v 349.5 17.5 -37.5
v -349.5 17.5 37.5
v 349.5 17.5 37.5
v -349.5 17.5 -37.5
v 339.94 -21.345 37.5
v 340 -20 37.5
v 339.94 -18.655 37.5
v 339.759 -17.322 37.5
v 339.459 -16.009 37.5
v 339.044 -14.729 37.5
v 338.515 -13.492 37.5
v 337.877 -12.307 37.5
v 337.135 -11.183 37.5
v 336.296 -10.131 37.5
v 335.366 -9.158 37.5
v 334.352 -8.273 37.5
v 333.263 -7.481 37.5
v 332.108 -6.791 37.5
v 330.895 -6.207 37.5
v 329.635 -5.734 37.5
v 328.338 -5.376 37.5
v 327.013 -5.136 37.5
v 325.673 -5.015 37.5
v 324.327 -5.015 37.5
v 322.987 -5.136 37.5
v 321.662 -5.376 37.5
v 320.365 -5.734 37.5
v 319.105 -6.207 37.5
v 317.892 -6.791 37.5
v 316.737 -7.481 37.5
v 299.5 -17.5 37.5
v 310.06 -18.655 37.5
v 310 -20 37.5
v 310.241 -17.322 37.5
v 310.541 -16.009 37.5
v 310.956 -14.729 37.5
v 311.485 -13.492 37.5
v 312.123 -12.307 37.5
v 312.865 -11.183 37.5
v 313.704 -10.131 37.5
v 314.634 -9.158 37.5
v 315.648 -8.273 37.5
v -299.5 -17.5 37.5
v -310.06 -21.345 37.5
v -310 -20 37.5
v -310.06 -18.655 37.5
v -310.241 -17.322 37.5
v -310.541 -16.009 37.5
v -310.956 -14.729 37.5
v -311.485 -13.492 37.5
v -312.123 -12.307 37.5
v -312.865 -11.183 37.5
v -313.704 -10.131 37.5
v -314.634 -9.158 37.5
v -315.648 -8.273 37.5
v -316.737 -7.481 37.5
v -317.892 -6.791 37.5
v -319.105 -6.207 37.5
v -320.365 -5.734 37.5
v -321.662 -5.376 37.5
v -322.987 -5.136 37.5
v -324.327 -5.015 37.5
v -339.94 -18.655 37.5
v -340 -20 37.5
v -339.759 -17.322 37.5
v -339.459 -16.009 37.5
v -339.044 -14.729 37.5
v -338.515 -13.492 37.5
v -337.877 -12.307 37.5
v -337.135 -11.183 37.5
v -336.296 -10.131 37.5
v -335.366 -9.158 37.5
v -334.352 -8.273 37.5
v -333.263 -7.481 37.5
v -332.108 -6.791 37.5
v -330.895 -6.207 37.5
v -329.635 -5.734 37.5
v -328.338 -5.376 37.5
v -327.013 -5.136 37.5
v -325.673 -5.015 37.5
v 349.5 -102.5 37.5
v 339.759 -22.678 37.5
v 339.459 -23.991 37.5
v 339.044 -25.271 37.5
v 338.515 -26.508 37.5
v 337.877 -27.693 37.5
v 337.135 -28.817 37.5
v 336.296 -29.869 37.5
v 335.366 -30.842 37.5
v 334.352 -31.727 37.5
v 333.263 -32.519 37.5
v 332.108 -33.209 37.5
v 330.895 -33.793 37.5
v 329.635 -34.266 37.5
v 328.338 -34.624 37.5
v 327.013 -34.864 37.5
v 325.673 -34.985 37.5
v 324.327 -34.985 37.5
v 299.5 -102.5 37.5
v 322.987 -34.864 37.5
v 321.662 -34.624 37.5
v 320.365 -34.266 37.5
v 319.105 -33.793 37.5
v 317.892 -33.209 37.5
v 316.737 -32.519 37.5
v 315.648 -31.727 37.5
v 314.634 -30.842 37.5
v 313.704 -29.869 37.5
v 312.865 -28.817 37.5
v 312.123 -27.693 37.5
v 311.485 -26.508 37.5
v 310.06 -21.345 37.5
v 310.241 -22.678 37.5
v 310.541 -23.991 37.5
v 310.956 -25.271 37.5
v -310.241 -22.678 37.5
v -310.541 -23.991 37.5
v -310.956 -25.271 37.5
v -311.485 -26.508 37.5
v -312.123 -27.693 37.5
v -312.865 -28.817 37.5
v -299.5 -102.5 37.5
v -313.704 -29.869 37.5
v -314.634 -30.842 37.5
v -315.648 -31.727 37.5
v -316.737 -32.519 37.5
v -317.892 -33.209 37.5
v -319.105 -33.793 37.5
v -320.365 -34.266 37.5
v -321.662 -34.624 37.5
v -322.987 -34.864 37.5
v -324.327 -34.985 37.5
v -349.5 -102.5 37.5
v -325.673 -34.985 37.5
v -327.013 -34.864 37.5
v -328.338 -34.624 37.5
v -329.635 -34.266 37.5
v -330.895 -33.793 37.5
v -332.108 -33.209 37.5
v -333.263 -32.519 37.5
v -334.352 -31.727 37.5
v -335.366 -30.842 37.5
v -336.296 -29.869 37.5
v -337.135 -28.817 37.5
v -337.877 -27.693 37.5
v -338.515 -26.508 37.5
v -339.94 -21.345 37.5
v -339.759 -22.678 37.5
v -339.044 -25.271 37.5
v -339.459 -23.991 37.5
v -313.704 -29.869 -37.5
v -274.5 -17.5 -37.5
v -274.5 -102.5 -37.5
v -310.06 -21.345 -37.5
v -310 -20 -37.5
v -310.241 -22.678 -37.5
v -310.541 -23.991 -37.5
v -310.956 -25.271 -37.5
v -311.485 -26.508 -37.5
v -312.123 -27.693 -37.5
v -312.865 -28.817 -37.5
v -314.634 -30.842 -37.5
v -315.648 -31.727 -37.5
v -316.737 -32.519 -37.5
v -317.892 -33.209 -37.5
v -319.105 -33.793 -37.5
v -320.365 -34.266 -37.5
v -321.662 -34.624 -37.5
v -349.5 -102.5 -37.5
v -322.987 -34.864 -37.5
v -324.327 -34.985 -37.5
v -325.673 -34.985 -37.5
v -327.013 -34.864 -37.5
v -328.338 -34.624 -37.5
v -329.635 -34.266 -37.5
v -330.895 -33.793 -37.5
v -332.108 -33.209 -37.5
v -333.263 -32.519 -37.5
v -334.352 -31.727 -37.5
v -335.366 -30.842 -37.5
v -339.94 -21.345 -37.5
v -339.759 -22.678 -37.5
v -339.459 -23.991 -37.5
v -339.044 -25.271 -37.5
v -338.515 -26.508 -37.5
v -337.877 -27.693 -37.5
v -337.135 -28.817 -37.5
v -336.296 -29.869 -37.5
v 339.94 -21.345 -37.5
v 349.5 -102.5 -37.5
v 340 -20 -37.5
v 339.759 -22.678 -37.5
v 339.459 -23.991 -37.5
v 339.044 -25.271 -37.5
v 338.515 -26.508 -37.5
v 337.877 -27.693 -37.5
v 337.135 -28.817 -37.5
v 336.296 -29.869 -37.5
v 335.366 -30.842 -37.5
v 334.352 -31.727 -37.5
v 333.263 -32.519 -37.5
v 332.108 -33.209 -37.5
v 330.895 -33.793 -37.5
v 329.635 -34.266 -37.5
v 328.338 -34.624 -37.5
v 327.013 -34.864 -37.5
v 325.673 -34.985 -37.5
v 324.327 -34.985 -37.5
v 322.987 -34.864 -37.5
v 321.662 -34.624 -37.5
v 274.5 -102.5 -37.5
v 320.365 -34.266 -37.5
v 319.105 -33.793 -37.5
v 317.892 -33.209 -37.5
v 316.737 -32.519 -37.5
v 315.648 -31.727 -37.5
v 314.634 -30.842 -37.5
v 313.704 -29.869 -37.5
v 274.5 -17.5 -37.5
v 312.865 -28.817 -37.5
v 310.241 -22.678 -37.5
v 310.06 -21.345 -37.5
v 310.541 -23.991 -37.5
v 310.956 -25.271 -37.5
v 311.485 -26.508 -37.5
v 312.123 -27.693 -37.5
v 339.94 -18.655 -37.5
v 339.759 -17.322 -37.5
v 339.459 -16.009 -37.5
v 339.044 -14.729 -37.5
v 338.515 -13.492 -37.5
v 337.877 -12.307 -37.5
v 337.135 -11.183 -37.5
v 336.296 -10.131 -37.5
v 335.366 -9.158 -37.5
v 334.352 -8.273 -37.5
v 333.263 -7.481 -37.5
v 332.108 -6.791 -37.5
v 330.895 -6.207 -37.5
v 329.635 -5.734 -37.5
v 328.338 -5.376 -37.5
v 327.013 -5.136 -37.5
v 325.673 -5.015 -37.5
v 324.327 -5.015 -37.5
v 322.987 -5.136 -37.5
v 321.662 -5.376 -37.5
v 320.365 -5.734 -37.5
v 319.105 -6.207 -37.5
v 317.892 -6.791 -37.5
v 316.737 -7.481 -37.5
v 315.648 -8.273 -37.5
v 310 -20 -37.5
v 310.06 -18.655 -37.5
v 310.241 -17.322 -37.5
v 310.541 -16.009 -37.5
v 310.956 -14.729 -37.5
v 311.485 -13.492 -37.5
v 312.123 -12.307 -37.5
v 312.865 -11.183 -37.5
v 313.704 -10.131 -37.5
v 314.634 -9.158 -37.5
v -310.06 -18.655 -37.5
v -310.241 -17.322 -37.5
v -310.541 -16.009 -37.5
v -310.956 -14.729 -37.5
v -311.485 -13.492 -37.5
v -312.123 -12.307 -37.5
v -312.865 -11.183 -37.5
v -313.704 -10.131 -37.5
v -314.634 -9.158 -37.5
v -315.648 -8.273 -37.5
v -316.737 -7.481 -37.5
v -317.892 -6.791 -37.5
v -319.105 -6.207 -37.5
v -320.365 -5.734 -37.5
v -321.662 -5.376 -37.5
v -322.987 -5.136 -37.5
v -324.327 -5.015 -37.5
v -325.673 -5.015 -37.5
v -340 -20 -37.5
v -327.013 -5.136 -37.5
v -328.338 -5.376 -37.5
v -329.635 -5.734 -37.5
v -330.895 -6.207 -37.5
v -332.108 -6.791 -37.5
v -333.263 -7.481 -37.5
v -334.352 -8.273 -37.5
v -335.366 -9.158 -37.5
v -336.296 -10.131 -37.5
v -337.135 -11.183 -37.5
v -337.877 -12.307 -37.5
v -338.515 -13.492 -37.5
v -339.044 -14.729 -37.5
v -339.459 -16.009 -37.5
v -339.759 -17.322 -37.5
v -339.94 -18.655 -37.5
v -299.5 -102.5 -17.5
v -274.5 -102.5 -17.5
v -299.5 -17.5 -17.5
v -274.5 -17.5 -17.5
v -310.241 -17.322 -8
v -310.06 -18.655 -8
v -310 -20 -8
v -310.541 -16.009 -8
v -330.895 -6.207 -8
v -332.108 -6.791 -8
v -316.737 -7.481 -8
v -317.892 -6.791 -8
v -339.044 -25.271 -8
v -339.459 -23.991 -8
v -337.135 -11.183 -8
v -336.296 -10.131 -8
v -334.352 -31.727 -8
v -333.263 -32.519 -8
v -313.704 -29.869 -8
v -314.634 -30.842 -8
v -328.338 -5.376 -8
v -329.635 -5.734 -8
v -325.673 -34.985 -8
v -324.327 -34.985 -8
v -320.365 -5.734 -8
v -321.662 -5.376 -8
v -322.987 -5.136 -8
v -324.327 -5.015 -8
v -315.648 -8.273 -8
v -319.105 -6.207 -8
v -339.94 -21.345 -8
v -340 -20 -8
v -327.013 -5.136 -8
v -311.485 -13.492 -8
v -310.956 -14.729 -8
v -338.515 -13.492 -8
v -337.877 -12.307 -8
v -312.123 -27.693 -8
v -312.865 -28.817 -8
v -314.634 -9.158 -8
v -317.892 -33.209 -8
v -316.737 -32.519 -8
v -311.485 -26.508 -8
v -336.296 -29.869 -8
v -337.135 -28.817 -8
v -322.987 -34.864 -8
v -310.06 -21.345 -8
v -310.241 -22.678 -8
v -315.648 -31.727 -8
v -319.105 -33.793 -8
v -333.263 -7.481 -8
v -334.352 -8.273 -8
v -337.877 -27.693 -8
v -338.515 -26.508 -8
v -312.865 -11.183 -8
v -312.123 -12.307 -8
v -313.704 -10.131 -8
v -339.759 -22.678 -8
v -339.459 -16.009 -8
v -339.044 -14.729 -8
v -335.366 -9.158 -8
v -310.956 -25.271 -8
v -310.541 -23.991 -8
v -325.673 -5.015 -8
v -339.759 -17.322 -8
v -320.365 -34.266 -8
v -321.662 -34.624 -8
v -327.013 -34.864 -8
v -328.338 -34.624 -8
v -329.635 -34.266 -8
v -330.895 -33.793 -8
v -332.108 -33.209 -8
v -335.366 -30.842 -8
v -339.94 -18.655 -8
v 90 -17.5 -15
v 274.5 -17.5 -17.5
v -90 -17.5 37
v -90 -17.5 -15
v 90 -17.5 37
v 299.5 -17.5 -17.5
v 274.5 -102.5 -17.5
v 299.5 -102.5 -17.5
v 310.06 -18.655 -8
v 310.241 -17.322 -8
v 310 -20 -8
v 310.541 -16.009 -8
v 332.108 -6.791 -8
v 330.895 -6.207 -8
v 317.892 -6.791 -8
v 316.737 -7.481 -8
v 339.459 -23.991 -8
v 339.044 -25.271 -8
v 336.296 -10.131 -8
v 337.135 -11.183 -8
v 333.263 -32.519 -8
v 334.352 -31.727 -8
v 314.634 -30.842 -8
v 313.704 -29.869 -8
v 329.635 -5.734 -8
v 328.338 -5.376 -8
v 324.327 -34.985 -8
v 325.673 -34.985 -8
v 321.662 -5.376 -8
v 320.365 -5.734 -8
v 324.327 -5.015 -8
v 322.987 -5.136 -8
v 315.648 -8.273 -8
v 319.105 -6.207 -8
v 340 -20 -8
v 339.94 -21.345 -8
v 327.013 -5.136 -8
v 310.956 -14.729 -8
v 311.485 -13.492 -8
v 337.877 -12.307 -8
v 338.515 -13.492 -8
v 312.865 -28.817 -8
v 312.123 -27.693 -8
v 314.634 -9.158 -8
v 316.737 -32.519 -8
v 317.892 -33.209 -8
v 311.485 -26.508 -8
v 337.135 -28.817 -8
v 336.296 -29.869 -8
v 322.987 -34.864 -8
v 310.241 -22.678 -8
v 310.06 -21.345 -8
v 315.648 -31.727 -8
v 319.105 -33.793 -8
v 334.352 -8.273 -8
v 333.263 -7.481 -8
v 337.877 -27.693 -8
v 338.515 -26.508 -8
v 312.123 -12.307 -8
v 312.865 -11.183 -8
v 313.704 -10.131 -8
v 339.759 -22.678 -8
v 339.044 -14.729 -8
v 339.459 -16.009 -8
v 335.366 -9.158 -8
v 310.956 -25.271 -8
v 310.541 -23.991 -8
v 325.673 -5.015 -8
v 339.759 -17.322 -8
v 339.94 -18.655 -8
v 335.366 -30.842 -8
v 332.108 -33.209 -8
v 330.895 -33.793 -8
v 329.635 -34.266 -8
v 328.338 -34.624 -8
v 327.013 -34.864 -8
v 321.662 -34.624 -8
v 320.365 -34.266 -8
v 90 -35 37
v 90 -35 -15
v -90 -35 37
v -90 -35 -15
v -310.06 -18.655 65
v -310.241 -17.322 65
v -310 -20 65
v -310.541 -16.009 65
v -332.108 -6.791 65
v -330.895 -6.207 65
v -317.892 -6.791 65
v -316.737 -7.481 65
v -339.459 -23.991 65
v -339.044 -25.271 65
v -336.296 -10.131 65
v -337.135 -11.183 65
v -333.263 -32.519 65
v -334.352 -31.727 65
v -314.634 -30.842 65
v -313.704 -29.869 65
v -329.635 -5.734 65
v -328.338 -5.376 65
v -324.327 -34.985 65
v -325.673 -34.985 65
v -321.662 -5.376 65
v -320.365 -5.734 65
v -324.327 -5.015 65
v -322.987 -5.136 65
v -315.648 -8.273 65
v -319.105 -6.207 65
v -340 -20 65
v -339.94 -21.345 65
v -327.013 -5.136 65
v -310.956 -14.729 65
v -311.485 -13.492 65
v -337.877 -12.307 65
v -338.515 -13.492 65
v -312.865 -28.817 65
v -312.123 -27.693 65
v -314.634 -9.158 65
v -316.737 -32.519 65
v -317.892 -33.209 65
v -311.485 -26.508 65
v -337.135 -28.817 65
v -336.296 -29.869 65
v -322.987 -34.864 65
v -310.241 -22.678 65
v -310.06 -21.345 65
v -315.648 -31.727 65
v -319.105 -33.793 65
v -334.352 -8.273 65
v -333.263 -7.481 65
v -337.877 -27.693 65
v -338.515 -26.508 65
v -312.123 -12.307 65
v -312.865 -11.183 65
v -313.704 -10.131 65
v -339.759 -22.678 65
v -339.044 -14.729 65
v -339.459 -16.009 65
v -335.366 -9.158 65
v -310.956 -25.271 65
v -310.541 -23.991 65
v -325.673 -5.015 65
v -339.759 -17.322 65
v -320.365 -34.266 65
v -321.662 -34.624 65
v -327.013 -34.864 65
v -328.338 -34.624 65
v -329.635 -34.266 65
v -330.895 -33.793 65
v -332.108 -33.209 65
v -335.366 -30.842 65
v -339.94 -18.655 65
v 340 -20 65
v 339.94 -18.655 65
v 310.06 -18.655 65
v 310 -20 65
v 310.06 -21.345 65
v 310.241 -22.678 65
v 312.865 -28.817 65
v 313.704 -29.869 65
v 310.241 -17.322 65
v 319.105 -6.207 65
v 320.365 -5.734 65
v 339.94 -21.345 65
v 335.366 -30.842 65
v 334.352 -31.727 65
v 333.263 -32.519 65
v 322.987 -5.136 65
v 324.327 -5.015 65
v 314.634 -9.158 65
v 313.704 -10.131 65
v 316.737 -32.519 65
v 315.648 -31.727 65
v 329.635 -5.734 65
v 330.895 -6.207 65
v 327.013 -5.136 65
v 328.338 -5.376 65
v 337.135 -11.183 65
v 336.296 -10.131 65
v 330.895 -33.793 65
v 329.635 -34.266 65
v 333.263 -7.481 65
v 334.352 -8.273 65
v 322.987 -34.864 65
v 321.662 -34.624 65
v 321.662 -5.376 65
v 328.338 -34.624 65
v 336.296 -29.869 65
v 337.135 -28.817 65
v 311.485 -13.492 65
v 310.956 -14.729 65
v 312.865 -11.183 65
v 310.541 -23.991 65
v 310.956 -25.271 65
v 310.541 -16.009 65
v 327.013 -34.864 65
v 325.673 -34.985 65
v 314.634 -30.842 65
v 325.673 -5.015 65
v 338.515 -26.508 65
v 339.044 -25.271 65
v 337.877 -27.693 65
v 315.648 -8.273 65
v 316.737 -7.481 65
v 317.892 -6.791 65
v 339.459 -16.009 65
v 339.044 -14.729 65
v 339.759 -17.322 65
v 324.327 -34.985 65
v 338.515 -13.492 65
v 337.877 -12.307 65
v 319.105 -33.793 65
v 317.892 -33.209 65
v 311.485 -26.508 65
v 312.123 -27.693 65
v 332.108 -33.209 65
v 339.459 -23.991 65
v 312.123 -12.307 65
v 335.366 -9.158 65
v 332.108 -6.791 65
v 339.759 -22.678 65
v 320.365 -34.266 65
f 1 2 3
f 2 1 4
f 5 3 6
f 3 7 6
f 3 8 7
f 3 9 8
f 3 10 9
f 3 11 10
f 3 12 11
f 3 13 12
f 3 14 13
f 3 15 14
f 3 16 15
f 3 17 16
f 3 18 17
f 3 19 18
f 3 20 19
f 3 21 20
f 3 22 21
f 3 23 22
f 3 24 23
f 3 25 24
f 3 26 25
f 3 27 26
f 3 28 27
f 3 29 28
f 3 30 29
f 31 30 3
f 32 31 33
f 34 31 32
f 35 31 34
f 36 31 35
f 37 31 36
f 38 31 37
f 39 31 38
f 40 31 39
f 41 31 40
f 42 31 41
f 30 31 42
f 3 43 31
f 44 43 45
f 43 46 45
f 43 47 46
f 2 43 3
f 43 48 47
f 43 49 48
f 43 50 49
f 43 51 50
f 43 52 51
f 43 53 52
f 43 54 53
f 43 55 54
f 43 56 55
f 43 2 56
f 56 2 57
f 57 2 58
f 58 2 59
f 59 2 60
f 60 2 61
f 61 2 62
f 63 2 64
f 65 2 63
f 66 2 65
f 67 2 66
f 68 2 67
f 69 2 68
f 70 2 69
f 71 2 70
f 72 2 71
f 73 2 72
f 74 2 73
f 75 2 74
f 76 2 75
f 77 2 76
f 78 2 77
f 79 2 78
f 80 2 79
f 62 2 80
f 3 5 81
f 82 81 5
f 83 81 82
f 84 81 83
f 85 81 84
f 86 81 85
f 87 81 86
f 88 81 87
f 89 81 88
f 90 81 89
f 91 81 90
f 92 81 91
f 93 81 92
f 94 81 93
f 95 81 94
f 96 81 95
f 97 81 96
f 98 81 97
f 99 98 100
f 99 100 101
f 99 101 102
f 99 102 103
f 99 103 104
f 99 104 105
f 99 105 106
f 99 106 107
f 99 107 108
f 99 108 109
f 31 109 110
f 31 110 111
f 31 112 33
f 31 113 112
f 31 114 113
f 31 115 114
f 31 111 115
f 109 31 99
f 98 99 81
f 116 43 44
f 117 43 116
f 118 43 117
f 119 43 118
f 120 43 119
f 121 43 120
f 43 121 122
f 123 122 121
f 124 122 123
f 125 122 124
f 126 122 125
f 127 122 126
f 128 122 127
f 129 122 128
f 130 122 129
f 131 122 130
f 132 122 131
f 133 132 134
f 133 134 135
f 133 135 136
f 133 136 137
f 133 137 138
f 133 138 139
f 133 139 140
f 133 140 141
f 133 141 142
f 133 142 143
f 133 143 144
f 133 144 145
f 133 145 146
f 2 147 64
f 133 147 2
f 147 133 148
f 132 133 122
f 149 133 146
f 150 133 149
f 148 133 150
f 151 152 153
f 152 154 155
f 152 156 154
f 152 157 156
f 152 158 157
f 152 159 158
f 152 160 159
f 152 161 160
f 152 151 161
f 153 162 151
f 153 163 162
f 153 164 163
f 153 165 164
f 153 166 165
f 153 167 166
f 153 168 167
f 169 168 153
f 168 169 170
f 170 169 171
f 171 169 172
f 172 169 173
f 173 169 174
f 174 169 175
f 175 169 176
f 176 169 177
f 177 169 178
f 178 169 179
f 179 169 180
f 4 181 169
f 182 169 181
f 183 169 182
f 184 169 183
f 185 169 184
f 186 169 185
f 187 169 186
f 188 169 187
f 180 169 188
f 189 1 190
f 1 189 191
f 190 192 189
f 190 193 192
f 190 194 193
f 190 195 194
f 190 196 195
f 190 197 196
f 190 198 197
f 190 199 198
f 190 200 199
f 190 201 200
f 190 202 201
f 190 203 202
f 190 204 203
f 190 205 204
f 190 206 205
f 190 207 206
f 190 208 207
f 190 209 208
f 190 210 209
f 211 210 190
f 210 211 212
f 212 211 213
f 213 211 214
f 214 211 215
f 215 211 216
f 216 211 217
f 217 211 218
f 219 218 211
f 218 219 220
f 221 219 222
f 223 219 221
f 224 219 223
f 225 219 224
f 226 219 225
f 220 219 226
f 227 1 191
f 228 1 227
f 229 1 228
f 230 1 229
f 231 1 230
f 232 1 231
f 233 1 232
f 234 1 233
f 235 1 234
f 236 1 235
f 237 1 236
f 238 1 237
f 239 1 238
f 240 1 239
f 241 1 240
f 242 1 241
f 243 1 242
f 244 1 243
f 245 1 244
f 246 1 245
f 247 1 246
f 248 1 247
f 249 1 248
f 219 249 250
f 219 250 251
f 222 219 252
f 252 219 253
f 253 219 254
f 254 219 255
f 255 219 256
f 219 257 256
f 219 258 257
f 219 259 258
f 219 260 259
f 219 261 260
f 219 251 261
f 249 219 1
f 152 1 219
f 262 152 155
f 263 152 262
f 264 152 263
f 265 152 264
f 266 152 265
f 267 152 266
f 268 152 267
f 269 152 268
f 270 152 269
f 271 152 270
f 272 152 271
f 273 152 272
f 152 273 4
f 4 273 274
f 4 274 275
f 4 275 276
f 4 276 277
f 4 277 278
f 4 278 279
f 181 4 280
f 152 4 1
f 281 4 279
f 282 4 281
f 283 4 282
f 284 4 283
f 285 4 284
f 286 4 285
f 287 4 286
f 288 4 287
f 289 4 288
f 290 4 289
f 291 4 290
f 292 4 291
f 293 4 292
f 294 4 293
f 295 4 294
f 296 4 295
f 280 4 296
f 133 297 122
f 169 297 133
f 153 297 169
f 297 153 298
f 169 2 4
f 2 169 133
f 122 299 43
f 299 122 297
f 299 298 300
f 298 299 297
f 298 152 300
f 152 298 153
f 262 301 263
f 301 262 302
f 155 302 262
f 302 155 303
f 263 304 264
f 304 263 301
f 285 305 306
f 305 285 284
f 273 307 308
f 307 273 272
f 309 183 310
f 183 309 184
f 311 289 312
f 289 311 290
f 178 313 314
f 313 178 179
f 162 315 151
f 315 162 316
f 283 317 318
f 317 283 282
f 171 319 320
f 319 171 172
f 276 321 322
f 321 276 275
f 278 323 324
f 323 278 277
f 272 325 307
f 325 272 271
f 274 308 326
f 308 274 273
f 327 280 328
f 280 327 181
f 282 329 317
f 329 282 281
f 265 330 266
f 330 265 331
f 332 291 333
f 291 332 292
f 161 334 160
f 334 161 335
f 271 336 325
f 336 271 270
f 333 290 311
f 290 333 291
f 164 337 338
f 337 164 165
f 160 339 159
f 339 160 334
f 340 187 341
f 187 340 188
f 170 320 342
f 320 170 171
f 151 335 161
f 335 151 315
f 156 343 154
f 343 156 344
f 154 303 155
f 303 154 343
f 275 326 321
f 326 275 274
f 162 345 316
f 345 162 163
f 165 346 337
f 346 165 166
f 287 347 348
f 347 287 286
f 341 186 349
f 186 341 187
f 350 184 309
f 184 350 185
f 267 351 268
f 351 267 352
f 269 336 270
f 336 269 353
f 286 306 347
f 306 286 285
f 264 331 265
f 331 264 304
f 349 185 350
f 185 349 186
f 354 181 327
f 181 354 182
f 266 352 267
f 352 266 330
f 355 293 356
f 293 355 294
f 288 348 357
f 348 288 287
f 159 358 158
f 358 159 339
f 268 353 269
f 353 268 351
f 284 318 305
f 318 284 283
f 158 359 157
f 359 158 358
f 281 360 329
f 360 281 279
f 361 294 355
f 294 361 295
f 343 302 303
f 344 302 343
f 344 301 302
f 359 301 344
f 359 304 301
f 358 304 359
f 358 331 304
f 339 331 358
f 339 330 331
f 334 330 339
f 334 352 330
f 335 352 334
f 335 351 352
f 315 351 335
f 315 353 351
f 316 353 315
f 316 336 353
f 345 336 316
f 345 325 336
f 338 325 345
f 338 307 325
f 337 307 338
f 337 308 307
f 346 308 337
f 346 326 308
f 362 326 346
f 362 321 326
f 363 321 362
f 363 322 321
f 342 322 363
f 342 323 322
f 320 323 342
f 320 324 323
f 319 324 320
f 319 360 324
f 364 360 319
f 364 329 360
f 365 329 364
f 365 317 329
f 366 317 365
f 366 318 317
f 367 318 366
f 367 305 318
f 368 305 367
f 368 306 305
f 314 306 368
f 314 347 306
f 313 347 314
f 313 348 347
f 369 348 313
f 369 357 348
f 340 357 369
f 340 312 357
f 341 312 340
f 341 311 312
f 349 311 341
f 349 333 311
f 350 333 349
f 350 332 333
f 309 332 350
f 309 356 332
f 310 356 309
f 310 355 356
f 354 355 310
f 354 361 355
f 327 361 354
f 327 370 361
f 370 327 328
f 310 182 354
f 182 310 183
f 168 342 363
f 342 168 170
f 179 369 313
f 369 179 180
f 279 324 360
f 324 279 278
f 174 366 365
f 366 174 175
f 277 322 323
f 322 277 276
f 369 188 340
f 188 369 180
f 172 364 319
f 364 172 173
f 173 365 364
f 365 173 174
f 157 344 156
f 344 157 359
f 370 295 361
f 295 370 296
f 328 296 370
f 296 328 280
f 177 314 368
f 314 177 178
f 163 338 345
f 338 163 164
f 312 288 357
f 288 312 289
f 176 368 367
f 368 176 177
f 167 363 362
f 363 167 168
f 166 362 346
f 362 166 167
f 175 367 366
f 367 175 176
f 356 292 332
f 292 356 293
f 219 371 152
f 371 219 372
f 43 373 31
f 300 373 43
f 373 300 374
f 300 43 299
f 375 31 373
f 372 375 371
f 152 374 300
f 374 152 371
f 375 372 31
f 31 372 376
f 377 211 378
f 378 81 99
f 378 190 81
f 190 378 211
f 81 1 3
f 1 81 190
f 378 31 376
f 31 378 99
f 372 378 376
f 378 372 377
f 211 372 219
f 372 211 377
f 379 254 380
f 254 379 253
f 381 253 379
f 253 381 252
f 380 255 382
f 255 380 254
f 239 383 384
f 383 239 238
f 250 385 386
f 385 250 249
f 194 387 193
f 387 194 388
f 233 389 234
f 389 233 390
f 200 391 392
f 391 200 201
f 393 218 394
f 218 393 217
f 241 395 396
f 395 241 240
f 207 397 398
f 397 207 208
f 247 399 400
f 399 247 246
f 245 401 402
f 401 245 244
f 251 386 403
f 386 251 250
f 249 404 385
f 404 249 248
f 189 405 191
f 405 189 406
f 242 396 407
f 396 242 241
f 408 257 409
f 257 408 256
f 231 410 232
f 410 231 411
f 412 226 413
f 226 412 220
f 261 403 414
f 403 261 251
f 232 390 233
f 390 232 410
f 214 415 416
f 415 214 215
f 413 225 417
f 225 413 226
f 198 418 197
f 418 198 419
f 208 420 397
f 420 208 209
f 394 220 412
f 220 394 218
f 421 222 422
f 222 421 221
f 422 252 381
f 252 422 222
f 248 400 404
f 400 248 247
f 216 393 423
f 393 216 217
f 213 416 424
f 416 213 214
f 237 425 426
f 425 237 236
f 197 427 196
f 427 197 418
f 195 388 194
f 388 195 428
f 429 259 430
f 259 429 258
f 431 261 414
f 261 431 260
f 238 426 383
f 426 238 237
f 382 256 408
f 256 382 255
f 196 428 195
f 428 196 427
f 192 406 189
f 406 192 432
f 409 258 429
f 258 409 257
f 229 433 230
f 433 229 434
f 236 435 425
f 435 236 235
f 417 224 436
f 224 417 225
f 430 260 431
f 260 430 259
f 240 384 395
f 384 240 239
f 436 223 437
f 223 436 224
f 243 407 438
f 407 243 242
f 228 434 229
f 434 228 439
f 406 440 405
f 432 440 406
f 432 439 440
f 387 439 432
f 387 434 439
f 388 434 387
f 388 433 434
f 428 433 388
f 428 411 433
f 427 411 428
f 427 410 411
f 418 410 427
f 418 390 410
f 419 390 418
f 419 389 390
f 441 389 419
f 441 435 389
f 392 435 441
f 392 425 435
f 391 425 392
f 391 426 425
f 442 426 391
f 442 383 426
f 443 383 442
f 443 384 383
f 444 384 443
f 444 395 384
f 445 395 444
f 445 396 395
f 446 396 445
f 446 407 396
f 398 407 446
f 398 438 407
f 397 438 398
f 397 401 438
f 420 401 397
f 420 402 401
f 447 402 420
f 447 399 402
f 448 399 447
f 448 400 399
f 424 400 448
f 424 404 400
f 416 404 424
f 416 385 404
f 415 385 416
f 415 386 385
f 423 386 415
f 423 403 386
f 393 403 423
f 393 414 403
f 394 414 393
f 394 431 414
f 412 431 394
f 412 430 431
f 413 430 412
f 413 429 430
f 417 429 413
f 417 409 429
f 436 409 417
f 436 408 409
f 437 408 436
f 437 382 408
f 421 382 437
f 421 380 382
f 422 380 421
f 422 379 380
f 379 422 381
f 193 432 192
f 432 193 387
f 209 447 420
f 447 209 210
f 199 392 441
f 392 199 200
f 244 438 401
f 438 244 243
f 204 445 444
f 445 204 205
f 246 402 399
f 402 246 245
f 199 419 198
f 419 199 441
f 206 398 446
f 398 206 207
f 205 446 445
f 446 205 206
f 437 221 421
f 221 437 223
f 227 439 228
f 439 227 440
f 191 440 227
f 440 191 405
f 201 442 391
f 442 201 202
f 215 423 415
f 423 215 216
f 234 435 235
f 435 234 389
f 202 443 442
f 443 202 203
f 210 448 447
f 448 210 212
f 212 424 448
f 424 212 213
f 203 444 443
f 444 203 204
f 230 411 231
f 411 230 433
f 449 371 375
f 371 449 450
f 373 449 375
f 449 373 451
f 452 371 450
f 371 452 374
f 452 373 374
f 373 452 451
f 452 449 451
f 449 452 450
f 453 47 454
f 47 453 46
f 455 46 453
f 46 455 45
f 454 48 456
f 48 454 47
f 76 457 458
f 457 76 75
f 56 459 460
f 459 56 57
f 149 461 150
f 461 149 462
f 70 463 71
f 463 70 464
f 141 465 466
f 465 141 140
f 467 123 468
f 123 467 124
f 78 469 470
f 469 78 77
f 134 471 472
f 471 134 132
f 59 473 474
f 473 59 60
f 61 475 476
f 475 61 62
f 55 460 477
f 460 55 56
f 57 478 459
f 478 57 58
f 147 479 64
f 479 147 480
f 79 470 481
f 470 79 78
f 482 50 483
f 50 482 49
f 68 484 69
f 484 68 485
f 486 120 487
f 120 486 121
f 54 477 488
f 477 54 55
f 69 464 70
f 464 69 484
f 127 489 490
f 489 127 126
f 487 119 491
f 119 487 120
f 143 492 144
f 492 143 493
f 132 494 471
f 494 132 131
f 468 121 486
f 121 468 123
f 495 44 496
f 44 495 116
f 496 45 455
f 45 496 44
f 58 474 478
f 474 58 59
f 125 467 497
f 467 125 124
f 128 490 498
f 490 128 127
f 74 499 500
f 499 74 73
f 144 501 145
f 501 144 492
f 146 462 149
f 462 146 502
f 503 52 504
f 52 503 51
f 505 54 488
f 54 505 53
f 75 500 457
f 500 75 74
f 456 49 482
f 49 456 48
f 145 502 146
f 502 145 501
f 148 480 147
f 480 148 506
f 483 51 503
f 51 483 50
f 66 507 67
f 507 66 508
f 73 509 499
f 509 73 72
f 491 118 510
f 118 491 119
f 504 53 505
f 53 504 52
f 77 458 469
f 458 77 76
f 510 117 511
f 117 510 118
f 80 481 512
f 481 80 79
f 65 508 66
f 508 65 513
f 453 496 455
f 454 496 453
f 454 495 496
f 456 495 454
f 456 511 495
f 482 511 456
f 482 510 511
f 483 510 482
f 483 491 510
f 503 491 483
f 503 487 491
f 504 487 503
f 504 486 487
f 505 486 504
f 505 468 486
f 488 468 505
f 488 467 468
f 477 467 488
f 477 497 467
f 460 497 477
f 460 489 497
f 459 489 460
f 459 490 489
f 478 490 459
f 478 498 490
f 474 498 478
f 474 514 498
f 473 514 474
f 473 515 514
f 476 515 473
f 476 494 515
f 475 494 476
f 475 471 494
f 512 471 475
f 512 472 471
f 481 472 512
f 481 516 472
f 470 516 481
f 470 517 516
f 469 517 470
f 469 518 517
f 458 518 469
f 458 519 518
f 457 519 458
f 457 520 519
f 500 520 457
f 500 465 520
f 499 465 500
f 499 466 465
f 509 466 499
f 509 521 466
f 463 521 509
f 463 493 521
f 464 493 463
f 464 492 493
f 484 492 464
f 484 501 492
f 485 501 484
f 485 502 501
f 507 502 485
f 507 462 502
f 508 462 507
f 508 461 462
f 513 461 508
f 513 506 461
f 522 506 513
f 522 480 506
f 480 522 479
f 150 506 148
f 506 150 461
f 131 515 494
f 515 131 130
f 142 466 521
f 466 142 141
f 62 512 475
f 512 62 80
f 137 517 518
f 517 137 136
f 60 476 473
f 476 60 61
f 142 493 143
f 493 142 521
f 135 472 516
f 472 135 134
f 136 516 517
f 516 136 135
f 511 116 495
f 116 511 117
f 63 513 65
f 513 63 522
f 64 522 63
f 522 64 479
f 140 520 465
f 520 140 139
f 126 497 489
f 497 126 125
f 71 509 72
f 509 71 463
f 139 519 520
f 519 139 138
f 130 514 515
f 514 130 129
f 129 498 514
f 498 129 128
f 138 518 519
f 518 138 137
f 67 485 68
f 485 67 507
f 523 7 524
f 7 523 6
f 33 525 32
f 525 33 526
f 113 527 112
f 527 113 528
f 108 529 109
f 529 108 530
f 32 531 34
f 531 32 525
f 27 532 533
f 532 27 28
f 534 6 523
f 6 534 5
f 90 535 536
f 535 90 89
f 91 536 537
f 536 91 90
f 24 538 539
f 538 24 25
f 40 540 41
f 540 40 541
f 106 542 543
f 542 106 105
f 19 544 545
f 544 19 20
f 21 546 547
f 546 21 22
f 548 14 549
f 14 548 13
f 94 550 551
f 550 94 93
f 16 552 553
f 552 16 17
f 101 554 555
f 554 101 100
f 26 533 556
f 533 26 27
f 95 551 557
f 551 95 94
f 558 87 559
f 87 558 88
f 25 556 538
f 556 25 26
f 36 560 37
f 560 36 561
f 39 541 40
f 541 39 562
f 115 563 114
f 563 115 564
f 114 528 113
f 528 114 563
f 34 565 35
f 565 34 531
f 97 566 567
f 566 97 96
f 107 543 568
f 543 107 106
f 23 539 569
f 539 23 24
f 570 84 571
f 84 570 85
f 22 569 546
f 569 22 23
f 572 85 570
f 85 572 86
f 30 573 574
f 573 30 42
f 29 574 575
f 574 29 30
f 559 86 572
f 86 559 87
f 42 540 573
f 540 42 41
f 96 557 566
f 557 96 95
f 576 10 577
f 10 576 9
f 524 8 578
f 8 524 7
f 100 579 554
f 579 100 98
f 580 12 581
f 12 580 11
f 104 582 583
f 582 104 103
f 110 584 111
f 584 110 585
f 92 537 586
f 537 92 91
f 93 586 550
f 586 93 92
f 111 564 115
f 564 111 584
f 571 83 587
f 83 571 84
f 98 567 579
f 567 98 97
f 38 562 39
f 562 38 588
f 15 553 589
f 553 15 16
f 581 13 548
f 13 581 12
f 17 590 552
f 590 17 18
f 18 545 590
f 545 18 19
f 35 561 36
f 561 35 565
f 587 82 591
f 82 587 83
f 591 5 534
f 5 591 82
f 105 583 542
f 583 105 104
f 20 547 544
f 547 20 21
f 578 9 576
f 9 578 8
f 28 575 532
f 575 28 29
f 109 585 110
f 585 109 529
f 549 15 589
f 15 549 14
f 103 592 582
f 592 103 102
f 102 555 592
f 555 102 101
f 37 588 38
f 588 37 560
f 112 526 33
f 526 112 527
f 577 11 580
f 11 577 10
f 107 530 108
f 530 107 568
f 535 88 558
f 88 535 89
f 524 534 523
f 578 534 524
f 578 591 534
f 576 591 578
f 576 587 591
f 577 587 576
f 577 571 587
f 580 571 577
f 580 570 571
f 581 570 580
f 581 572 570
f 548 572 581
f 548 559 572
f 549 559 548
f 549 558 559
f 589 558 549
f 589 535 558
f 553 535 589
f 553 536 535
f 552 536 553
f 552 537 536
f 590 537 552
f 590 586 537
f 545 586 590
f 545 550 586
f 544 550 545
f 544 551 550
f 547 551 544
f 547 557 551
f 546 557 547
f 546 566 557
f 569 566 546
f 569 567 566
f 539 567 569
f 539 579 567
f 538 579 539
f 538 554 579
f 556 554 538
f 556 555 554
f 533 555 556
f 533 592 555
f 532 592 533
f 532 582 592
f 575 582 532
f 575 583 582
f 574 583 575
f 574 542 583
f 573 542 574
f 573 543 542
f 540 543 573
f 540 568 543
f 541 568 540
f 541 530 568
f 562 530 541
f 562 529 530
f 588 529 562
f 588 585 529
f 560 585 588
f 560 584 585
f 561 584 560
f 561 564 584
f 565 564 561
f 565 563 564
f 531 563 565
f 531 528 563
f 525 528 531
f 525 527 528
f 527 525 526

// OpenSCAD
// Project: FRANKE CAD 
// Author : Marc Amil 
// Company: Mycrobez 
// Date: 09.03.2021

// Things needed to find out:


//////////// Parameters/////////////////
// 1 unit = 1 mm
$fn = 70; 

//Backwall parameters 
backwall_height = 75;
backwall_width = 600;
backwall_depth = 35;

//Sidewall parameters 
sidewall_height = 75;
sidewall_width = 120;
sidewall_depth = 50; 

// Support sidewall parameters 
support_sw_height = 20;
support_sw_width = 120;
support_sw_depth = 27;

// Middle blok parameters 
middle_block_height = 52;
middle_block_width = 180;
middle_block_depth = 20;


//pimple and dimple parameters 
pimple_height = 30;
pimple_radius = 15;



///////RENDERS?////////////
 wall();

mirror([1,0,0]) {
difference() {
translate([-299.5, - 102.5, -37.5])
sidewall();
translate([-325,-20, -38])
    pimple();
    }
}



translate([0,-25,11]) {
    middleblock();
}



translate([-325,-20, 35])
    pimple();
mirror([1,0,0]) {
translate([-325,-20, 35])
    pimple();
}


 ///////////Modules////////////////////
 module semicircle() {
     difference(){
  cylinder(r=1, h=60);
     translate([0,1,30])
     cube([4,3,100], center = true);
}
}

module wall() {
    union() {
backwall();
difference() {
translate([-299.5, - 102.5, -37.5])
sidewall();
translate([-325,-20, -38])
    pimple();
        }
 }
}


 module backwall() {
     cube([backwall_width, backwall_depth, backwall_height], center = true);
 }
 
 module sidewall() {
 union(){
    rotate([0,0 ,90]) {
     cube([sidewall_width, sidewall_depth, sidewall_height]);
  translate([0,-25 ,0])
    cube([support_sw_width, support_sw_depth, support_sw_height]); 
    }
 }
}

module middleblock() {
    cube([middle_block_width, middle_block_depth, middle_block_height], center = true );
}


module pimple() {
    cylinder(h = pimple_height , r = pimple_radius);
}
